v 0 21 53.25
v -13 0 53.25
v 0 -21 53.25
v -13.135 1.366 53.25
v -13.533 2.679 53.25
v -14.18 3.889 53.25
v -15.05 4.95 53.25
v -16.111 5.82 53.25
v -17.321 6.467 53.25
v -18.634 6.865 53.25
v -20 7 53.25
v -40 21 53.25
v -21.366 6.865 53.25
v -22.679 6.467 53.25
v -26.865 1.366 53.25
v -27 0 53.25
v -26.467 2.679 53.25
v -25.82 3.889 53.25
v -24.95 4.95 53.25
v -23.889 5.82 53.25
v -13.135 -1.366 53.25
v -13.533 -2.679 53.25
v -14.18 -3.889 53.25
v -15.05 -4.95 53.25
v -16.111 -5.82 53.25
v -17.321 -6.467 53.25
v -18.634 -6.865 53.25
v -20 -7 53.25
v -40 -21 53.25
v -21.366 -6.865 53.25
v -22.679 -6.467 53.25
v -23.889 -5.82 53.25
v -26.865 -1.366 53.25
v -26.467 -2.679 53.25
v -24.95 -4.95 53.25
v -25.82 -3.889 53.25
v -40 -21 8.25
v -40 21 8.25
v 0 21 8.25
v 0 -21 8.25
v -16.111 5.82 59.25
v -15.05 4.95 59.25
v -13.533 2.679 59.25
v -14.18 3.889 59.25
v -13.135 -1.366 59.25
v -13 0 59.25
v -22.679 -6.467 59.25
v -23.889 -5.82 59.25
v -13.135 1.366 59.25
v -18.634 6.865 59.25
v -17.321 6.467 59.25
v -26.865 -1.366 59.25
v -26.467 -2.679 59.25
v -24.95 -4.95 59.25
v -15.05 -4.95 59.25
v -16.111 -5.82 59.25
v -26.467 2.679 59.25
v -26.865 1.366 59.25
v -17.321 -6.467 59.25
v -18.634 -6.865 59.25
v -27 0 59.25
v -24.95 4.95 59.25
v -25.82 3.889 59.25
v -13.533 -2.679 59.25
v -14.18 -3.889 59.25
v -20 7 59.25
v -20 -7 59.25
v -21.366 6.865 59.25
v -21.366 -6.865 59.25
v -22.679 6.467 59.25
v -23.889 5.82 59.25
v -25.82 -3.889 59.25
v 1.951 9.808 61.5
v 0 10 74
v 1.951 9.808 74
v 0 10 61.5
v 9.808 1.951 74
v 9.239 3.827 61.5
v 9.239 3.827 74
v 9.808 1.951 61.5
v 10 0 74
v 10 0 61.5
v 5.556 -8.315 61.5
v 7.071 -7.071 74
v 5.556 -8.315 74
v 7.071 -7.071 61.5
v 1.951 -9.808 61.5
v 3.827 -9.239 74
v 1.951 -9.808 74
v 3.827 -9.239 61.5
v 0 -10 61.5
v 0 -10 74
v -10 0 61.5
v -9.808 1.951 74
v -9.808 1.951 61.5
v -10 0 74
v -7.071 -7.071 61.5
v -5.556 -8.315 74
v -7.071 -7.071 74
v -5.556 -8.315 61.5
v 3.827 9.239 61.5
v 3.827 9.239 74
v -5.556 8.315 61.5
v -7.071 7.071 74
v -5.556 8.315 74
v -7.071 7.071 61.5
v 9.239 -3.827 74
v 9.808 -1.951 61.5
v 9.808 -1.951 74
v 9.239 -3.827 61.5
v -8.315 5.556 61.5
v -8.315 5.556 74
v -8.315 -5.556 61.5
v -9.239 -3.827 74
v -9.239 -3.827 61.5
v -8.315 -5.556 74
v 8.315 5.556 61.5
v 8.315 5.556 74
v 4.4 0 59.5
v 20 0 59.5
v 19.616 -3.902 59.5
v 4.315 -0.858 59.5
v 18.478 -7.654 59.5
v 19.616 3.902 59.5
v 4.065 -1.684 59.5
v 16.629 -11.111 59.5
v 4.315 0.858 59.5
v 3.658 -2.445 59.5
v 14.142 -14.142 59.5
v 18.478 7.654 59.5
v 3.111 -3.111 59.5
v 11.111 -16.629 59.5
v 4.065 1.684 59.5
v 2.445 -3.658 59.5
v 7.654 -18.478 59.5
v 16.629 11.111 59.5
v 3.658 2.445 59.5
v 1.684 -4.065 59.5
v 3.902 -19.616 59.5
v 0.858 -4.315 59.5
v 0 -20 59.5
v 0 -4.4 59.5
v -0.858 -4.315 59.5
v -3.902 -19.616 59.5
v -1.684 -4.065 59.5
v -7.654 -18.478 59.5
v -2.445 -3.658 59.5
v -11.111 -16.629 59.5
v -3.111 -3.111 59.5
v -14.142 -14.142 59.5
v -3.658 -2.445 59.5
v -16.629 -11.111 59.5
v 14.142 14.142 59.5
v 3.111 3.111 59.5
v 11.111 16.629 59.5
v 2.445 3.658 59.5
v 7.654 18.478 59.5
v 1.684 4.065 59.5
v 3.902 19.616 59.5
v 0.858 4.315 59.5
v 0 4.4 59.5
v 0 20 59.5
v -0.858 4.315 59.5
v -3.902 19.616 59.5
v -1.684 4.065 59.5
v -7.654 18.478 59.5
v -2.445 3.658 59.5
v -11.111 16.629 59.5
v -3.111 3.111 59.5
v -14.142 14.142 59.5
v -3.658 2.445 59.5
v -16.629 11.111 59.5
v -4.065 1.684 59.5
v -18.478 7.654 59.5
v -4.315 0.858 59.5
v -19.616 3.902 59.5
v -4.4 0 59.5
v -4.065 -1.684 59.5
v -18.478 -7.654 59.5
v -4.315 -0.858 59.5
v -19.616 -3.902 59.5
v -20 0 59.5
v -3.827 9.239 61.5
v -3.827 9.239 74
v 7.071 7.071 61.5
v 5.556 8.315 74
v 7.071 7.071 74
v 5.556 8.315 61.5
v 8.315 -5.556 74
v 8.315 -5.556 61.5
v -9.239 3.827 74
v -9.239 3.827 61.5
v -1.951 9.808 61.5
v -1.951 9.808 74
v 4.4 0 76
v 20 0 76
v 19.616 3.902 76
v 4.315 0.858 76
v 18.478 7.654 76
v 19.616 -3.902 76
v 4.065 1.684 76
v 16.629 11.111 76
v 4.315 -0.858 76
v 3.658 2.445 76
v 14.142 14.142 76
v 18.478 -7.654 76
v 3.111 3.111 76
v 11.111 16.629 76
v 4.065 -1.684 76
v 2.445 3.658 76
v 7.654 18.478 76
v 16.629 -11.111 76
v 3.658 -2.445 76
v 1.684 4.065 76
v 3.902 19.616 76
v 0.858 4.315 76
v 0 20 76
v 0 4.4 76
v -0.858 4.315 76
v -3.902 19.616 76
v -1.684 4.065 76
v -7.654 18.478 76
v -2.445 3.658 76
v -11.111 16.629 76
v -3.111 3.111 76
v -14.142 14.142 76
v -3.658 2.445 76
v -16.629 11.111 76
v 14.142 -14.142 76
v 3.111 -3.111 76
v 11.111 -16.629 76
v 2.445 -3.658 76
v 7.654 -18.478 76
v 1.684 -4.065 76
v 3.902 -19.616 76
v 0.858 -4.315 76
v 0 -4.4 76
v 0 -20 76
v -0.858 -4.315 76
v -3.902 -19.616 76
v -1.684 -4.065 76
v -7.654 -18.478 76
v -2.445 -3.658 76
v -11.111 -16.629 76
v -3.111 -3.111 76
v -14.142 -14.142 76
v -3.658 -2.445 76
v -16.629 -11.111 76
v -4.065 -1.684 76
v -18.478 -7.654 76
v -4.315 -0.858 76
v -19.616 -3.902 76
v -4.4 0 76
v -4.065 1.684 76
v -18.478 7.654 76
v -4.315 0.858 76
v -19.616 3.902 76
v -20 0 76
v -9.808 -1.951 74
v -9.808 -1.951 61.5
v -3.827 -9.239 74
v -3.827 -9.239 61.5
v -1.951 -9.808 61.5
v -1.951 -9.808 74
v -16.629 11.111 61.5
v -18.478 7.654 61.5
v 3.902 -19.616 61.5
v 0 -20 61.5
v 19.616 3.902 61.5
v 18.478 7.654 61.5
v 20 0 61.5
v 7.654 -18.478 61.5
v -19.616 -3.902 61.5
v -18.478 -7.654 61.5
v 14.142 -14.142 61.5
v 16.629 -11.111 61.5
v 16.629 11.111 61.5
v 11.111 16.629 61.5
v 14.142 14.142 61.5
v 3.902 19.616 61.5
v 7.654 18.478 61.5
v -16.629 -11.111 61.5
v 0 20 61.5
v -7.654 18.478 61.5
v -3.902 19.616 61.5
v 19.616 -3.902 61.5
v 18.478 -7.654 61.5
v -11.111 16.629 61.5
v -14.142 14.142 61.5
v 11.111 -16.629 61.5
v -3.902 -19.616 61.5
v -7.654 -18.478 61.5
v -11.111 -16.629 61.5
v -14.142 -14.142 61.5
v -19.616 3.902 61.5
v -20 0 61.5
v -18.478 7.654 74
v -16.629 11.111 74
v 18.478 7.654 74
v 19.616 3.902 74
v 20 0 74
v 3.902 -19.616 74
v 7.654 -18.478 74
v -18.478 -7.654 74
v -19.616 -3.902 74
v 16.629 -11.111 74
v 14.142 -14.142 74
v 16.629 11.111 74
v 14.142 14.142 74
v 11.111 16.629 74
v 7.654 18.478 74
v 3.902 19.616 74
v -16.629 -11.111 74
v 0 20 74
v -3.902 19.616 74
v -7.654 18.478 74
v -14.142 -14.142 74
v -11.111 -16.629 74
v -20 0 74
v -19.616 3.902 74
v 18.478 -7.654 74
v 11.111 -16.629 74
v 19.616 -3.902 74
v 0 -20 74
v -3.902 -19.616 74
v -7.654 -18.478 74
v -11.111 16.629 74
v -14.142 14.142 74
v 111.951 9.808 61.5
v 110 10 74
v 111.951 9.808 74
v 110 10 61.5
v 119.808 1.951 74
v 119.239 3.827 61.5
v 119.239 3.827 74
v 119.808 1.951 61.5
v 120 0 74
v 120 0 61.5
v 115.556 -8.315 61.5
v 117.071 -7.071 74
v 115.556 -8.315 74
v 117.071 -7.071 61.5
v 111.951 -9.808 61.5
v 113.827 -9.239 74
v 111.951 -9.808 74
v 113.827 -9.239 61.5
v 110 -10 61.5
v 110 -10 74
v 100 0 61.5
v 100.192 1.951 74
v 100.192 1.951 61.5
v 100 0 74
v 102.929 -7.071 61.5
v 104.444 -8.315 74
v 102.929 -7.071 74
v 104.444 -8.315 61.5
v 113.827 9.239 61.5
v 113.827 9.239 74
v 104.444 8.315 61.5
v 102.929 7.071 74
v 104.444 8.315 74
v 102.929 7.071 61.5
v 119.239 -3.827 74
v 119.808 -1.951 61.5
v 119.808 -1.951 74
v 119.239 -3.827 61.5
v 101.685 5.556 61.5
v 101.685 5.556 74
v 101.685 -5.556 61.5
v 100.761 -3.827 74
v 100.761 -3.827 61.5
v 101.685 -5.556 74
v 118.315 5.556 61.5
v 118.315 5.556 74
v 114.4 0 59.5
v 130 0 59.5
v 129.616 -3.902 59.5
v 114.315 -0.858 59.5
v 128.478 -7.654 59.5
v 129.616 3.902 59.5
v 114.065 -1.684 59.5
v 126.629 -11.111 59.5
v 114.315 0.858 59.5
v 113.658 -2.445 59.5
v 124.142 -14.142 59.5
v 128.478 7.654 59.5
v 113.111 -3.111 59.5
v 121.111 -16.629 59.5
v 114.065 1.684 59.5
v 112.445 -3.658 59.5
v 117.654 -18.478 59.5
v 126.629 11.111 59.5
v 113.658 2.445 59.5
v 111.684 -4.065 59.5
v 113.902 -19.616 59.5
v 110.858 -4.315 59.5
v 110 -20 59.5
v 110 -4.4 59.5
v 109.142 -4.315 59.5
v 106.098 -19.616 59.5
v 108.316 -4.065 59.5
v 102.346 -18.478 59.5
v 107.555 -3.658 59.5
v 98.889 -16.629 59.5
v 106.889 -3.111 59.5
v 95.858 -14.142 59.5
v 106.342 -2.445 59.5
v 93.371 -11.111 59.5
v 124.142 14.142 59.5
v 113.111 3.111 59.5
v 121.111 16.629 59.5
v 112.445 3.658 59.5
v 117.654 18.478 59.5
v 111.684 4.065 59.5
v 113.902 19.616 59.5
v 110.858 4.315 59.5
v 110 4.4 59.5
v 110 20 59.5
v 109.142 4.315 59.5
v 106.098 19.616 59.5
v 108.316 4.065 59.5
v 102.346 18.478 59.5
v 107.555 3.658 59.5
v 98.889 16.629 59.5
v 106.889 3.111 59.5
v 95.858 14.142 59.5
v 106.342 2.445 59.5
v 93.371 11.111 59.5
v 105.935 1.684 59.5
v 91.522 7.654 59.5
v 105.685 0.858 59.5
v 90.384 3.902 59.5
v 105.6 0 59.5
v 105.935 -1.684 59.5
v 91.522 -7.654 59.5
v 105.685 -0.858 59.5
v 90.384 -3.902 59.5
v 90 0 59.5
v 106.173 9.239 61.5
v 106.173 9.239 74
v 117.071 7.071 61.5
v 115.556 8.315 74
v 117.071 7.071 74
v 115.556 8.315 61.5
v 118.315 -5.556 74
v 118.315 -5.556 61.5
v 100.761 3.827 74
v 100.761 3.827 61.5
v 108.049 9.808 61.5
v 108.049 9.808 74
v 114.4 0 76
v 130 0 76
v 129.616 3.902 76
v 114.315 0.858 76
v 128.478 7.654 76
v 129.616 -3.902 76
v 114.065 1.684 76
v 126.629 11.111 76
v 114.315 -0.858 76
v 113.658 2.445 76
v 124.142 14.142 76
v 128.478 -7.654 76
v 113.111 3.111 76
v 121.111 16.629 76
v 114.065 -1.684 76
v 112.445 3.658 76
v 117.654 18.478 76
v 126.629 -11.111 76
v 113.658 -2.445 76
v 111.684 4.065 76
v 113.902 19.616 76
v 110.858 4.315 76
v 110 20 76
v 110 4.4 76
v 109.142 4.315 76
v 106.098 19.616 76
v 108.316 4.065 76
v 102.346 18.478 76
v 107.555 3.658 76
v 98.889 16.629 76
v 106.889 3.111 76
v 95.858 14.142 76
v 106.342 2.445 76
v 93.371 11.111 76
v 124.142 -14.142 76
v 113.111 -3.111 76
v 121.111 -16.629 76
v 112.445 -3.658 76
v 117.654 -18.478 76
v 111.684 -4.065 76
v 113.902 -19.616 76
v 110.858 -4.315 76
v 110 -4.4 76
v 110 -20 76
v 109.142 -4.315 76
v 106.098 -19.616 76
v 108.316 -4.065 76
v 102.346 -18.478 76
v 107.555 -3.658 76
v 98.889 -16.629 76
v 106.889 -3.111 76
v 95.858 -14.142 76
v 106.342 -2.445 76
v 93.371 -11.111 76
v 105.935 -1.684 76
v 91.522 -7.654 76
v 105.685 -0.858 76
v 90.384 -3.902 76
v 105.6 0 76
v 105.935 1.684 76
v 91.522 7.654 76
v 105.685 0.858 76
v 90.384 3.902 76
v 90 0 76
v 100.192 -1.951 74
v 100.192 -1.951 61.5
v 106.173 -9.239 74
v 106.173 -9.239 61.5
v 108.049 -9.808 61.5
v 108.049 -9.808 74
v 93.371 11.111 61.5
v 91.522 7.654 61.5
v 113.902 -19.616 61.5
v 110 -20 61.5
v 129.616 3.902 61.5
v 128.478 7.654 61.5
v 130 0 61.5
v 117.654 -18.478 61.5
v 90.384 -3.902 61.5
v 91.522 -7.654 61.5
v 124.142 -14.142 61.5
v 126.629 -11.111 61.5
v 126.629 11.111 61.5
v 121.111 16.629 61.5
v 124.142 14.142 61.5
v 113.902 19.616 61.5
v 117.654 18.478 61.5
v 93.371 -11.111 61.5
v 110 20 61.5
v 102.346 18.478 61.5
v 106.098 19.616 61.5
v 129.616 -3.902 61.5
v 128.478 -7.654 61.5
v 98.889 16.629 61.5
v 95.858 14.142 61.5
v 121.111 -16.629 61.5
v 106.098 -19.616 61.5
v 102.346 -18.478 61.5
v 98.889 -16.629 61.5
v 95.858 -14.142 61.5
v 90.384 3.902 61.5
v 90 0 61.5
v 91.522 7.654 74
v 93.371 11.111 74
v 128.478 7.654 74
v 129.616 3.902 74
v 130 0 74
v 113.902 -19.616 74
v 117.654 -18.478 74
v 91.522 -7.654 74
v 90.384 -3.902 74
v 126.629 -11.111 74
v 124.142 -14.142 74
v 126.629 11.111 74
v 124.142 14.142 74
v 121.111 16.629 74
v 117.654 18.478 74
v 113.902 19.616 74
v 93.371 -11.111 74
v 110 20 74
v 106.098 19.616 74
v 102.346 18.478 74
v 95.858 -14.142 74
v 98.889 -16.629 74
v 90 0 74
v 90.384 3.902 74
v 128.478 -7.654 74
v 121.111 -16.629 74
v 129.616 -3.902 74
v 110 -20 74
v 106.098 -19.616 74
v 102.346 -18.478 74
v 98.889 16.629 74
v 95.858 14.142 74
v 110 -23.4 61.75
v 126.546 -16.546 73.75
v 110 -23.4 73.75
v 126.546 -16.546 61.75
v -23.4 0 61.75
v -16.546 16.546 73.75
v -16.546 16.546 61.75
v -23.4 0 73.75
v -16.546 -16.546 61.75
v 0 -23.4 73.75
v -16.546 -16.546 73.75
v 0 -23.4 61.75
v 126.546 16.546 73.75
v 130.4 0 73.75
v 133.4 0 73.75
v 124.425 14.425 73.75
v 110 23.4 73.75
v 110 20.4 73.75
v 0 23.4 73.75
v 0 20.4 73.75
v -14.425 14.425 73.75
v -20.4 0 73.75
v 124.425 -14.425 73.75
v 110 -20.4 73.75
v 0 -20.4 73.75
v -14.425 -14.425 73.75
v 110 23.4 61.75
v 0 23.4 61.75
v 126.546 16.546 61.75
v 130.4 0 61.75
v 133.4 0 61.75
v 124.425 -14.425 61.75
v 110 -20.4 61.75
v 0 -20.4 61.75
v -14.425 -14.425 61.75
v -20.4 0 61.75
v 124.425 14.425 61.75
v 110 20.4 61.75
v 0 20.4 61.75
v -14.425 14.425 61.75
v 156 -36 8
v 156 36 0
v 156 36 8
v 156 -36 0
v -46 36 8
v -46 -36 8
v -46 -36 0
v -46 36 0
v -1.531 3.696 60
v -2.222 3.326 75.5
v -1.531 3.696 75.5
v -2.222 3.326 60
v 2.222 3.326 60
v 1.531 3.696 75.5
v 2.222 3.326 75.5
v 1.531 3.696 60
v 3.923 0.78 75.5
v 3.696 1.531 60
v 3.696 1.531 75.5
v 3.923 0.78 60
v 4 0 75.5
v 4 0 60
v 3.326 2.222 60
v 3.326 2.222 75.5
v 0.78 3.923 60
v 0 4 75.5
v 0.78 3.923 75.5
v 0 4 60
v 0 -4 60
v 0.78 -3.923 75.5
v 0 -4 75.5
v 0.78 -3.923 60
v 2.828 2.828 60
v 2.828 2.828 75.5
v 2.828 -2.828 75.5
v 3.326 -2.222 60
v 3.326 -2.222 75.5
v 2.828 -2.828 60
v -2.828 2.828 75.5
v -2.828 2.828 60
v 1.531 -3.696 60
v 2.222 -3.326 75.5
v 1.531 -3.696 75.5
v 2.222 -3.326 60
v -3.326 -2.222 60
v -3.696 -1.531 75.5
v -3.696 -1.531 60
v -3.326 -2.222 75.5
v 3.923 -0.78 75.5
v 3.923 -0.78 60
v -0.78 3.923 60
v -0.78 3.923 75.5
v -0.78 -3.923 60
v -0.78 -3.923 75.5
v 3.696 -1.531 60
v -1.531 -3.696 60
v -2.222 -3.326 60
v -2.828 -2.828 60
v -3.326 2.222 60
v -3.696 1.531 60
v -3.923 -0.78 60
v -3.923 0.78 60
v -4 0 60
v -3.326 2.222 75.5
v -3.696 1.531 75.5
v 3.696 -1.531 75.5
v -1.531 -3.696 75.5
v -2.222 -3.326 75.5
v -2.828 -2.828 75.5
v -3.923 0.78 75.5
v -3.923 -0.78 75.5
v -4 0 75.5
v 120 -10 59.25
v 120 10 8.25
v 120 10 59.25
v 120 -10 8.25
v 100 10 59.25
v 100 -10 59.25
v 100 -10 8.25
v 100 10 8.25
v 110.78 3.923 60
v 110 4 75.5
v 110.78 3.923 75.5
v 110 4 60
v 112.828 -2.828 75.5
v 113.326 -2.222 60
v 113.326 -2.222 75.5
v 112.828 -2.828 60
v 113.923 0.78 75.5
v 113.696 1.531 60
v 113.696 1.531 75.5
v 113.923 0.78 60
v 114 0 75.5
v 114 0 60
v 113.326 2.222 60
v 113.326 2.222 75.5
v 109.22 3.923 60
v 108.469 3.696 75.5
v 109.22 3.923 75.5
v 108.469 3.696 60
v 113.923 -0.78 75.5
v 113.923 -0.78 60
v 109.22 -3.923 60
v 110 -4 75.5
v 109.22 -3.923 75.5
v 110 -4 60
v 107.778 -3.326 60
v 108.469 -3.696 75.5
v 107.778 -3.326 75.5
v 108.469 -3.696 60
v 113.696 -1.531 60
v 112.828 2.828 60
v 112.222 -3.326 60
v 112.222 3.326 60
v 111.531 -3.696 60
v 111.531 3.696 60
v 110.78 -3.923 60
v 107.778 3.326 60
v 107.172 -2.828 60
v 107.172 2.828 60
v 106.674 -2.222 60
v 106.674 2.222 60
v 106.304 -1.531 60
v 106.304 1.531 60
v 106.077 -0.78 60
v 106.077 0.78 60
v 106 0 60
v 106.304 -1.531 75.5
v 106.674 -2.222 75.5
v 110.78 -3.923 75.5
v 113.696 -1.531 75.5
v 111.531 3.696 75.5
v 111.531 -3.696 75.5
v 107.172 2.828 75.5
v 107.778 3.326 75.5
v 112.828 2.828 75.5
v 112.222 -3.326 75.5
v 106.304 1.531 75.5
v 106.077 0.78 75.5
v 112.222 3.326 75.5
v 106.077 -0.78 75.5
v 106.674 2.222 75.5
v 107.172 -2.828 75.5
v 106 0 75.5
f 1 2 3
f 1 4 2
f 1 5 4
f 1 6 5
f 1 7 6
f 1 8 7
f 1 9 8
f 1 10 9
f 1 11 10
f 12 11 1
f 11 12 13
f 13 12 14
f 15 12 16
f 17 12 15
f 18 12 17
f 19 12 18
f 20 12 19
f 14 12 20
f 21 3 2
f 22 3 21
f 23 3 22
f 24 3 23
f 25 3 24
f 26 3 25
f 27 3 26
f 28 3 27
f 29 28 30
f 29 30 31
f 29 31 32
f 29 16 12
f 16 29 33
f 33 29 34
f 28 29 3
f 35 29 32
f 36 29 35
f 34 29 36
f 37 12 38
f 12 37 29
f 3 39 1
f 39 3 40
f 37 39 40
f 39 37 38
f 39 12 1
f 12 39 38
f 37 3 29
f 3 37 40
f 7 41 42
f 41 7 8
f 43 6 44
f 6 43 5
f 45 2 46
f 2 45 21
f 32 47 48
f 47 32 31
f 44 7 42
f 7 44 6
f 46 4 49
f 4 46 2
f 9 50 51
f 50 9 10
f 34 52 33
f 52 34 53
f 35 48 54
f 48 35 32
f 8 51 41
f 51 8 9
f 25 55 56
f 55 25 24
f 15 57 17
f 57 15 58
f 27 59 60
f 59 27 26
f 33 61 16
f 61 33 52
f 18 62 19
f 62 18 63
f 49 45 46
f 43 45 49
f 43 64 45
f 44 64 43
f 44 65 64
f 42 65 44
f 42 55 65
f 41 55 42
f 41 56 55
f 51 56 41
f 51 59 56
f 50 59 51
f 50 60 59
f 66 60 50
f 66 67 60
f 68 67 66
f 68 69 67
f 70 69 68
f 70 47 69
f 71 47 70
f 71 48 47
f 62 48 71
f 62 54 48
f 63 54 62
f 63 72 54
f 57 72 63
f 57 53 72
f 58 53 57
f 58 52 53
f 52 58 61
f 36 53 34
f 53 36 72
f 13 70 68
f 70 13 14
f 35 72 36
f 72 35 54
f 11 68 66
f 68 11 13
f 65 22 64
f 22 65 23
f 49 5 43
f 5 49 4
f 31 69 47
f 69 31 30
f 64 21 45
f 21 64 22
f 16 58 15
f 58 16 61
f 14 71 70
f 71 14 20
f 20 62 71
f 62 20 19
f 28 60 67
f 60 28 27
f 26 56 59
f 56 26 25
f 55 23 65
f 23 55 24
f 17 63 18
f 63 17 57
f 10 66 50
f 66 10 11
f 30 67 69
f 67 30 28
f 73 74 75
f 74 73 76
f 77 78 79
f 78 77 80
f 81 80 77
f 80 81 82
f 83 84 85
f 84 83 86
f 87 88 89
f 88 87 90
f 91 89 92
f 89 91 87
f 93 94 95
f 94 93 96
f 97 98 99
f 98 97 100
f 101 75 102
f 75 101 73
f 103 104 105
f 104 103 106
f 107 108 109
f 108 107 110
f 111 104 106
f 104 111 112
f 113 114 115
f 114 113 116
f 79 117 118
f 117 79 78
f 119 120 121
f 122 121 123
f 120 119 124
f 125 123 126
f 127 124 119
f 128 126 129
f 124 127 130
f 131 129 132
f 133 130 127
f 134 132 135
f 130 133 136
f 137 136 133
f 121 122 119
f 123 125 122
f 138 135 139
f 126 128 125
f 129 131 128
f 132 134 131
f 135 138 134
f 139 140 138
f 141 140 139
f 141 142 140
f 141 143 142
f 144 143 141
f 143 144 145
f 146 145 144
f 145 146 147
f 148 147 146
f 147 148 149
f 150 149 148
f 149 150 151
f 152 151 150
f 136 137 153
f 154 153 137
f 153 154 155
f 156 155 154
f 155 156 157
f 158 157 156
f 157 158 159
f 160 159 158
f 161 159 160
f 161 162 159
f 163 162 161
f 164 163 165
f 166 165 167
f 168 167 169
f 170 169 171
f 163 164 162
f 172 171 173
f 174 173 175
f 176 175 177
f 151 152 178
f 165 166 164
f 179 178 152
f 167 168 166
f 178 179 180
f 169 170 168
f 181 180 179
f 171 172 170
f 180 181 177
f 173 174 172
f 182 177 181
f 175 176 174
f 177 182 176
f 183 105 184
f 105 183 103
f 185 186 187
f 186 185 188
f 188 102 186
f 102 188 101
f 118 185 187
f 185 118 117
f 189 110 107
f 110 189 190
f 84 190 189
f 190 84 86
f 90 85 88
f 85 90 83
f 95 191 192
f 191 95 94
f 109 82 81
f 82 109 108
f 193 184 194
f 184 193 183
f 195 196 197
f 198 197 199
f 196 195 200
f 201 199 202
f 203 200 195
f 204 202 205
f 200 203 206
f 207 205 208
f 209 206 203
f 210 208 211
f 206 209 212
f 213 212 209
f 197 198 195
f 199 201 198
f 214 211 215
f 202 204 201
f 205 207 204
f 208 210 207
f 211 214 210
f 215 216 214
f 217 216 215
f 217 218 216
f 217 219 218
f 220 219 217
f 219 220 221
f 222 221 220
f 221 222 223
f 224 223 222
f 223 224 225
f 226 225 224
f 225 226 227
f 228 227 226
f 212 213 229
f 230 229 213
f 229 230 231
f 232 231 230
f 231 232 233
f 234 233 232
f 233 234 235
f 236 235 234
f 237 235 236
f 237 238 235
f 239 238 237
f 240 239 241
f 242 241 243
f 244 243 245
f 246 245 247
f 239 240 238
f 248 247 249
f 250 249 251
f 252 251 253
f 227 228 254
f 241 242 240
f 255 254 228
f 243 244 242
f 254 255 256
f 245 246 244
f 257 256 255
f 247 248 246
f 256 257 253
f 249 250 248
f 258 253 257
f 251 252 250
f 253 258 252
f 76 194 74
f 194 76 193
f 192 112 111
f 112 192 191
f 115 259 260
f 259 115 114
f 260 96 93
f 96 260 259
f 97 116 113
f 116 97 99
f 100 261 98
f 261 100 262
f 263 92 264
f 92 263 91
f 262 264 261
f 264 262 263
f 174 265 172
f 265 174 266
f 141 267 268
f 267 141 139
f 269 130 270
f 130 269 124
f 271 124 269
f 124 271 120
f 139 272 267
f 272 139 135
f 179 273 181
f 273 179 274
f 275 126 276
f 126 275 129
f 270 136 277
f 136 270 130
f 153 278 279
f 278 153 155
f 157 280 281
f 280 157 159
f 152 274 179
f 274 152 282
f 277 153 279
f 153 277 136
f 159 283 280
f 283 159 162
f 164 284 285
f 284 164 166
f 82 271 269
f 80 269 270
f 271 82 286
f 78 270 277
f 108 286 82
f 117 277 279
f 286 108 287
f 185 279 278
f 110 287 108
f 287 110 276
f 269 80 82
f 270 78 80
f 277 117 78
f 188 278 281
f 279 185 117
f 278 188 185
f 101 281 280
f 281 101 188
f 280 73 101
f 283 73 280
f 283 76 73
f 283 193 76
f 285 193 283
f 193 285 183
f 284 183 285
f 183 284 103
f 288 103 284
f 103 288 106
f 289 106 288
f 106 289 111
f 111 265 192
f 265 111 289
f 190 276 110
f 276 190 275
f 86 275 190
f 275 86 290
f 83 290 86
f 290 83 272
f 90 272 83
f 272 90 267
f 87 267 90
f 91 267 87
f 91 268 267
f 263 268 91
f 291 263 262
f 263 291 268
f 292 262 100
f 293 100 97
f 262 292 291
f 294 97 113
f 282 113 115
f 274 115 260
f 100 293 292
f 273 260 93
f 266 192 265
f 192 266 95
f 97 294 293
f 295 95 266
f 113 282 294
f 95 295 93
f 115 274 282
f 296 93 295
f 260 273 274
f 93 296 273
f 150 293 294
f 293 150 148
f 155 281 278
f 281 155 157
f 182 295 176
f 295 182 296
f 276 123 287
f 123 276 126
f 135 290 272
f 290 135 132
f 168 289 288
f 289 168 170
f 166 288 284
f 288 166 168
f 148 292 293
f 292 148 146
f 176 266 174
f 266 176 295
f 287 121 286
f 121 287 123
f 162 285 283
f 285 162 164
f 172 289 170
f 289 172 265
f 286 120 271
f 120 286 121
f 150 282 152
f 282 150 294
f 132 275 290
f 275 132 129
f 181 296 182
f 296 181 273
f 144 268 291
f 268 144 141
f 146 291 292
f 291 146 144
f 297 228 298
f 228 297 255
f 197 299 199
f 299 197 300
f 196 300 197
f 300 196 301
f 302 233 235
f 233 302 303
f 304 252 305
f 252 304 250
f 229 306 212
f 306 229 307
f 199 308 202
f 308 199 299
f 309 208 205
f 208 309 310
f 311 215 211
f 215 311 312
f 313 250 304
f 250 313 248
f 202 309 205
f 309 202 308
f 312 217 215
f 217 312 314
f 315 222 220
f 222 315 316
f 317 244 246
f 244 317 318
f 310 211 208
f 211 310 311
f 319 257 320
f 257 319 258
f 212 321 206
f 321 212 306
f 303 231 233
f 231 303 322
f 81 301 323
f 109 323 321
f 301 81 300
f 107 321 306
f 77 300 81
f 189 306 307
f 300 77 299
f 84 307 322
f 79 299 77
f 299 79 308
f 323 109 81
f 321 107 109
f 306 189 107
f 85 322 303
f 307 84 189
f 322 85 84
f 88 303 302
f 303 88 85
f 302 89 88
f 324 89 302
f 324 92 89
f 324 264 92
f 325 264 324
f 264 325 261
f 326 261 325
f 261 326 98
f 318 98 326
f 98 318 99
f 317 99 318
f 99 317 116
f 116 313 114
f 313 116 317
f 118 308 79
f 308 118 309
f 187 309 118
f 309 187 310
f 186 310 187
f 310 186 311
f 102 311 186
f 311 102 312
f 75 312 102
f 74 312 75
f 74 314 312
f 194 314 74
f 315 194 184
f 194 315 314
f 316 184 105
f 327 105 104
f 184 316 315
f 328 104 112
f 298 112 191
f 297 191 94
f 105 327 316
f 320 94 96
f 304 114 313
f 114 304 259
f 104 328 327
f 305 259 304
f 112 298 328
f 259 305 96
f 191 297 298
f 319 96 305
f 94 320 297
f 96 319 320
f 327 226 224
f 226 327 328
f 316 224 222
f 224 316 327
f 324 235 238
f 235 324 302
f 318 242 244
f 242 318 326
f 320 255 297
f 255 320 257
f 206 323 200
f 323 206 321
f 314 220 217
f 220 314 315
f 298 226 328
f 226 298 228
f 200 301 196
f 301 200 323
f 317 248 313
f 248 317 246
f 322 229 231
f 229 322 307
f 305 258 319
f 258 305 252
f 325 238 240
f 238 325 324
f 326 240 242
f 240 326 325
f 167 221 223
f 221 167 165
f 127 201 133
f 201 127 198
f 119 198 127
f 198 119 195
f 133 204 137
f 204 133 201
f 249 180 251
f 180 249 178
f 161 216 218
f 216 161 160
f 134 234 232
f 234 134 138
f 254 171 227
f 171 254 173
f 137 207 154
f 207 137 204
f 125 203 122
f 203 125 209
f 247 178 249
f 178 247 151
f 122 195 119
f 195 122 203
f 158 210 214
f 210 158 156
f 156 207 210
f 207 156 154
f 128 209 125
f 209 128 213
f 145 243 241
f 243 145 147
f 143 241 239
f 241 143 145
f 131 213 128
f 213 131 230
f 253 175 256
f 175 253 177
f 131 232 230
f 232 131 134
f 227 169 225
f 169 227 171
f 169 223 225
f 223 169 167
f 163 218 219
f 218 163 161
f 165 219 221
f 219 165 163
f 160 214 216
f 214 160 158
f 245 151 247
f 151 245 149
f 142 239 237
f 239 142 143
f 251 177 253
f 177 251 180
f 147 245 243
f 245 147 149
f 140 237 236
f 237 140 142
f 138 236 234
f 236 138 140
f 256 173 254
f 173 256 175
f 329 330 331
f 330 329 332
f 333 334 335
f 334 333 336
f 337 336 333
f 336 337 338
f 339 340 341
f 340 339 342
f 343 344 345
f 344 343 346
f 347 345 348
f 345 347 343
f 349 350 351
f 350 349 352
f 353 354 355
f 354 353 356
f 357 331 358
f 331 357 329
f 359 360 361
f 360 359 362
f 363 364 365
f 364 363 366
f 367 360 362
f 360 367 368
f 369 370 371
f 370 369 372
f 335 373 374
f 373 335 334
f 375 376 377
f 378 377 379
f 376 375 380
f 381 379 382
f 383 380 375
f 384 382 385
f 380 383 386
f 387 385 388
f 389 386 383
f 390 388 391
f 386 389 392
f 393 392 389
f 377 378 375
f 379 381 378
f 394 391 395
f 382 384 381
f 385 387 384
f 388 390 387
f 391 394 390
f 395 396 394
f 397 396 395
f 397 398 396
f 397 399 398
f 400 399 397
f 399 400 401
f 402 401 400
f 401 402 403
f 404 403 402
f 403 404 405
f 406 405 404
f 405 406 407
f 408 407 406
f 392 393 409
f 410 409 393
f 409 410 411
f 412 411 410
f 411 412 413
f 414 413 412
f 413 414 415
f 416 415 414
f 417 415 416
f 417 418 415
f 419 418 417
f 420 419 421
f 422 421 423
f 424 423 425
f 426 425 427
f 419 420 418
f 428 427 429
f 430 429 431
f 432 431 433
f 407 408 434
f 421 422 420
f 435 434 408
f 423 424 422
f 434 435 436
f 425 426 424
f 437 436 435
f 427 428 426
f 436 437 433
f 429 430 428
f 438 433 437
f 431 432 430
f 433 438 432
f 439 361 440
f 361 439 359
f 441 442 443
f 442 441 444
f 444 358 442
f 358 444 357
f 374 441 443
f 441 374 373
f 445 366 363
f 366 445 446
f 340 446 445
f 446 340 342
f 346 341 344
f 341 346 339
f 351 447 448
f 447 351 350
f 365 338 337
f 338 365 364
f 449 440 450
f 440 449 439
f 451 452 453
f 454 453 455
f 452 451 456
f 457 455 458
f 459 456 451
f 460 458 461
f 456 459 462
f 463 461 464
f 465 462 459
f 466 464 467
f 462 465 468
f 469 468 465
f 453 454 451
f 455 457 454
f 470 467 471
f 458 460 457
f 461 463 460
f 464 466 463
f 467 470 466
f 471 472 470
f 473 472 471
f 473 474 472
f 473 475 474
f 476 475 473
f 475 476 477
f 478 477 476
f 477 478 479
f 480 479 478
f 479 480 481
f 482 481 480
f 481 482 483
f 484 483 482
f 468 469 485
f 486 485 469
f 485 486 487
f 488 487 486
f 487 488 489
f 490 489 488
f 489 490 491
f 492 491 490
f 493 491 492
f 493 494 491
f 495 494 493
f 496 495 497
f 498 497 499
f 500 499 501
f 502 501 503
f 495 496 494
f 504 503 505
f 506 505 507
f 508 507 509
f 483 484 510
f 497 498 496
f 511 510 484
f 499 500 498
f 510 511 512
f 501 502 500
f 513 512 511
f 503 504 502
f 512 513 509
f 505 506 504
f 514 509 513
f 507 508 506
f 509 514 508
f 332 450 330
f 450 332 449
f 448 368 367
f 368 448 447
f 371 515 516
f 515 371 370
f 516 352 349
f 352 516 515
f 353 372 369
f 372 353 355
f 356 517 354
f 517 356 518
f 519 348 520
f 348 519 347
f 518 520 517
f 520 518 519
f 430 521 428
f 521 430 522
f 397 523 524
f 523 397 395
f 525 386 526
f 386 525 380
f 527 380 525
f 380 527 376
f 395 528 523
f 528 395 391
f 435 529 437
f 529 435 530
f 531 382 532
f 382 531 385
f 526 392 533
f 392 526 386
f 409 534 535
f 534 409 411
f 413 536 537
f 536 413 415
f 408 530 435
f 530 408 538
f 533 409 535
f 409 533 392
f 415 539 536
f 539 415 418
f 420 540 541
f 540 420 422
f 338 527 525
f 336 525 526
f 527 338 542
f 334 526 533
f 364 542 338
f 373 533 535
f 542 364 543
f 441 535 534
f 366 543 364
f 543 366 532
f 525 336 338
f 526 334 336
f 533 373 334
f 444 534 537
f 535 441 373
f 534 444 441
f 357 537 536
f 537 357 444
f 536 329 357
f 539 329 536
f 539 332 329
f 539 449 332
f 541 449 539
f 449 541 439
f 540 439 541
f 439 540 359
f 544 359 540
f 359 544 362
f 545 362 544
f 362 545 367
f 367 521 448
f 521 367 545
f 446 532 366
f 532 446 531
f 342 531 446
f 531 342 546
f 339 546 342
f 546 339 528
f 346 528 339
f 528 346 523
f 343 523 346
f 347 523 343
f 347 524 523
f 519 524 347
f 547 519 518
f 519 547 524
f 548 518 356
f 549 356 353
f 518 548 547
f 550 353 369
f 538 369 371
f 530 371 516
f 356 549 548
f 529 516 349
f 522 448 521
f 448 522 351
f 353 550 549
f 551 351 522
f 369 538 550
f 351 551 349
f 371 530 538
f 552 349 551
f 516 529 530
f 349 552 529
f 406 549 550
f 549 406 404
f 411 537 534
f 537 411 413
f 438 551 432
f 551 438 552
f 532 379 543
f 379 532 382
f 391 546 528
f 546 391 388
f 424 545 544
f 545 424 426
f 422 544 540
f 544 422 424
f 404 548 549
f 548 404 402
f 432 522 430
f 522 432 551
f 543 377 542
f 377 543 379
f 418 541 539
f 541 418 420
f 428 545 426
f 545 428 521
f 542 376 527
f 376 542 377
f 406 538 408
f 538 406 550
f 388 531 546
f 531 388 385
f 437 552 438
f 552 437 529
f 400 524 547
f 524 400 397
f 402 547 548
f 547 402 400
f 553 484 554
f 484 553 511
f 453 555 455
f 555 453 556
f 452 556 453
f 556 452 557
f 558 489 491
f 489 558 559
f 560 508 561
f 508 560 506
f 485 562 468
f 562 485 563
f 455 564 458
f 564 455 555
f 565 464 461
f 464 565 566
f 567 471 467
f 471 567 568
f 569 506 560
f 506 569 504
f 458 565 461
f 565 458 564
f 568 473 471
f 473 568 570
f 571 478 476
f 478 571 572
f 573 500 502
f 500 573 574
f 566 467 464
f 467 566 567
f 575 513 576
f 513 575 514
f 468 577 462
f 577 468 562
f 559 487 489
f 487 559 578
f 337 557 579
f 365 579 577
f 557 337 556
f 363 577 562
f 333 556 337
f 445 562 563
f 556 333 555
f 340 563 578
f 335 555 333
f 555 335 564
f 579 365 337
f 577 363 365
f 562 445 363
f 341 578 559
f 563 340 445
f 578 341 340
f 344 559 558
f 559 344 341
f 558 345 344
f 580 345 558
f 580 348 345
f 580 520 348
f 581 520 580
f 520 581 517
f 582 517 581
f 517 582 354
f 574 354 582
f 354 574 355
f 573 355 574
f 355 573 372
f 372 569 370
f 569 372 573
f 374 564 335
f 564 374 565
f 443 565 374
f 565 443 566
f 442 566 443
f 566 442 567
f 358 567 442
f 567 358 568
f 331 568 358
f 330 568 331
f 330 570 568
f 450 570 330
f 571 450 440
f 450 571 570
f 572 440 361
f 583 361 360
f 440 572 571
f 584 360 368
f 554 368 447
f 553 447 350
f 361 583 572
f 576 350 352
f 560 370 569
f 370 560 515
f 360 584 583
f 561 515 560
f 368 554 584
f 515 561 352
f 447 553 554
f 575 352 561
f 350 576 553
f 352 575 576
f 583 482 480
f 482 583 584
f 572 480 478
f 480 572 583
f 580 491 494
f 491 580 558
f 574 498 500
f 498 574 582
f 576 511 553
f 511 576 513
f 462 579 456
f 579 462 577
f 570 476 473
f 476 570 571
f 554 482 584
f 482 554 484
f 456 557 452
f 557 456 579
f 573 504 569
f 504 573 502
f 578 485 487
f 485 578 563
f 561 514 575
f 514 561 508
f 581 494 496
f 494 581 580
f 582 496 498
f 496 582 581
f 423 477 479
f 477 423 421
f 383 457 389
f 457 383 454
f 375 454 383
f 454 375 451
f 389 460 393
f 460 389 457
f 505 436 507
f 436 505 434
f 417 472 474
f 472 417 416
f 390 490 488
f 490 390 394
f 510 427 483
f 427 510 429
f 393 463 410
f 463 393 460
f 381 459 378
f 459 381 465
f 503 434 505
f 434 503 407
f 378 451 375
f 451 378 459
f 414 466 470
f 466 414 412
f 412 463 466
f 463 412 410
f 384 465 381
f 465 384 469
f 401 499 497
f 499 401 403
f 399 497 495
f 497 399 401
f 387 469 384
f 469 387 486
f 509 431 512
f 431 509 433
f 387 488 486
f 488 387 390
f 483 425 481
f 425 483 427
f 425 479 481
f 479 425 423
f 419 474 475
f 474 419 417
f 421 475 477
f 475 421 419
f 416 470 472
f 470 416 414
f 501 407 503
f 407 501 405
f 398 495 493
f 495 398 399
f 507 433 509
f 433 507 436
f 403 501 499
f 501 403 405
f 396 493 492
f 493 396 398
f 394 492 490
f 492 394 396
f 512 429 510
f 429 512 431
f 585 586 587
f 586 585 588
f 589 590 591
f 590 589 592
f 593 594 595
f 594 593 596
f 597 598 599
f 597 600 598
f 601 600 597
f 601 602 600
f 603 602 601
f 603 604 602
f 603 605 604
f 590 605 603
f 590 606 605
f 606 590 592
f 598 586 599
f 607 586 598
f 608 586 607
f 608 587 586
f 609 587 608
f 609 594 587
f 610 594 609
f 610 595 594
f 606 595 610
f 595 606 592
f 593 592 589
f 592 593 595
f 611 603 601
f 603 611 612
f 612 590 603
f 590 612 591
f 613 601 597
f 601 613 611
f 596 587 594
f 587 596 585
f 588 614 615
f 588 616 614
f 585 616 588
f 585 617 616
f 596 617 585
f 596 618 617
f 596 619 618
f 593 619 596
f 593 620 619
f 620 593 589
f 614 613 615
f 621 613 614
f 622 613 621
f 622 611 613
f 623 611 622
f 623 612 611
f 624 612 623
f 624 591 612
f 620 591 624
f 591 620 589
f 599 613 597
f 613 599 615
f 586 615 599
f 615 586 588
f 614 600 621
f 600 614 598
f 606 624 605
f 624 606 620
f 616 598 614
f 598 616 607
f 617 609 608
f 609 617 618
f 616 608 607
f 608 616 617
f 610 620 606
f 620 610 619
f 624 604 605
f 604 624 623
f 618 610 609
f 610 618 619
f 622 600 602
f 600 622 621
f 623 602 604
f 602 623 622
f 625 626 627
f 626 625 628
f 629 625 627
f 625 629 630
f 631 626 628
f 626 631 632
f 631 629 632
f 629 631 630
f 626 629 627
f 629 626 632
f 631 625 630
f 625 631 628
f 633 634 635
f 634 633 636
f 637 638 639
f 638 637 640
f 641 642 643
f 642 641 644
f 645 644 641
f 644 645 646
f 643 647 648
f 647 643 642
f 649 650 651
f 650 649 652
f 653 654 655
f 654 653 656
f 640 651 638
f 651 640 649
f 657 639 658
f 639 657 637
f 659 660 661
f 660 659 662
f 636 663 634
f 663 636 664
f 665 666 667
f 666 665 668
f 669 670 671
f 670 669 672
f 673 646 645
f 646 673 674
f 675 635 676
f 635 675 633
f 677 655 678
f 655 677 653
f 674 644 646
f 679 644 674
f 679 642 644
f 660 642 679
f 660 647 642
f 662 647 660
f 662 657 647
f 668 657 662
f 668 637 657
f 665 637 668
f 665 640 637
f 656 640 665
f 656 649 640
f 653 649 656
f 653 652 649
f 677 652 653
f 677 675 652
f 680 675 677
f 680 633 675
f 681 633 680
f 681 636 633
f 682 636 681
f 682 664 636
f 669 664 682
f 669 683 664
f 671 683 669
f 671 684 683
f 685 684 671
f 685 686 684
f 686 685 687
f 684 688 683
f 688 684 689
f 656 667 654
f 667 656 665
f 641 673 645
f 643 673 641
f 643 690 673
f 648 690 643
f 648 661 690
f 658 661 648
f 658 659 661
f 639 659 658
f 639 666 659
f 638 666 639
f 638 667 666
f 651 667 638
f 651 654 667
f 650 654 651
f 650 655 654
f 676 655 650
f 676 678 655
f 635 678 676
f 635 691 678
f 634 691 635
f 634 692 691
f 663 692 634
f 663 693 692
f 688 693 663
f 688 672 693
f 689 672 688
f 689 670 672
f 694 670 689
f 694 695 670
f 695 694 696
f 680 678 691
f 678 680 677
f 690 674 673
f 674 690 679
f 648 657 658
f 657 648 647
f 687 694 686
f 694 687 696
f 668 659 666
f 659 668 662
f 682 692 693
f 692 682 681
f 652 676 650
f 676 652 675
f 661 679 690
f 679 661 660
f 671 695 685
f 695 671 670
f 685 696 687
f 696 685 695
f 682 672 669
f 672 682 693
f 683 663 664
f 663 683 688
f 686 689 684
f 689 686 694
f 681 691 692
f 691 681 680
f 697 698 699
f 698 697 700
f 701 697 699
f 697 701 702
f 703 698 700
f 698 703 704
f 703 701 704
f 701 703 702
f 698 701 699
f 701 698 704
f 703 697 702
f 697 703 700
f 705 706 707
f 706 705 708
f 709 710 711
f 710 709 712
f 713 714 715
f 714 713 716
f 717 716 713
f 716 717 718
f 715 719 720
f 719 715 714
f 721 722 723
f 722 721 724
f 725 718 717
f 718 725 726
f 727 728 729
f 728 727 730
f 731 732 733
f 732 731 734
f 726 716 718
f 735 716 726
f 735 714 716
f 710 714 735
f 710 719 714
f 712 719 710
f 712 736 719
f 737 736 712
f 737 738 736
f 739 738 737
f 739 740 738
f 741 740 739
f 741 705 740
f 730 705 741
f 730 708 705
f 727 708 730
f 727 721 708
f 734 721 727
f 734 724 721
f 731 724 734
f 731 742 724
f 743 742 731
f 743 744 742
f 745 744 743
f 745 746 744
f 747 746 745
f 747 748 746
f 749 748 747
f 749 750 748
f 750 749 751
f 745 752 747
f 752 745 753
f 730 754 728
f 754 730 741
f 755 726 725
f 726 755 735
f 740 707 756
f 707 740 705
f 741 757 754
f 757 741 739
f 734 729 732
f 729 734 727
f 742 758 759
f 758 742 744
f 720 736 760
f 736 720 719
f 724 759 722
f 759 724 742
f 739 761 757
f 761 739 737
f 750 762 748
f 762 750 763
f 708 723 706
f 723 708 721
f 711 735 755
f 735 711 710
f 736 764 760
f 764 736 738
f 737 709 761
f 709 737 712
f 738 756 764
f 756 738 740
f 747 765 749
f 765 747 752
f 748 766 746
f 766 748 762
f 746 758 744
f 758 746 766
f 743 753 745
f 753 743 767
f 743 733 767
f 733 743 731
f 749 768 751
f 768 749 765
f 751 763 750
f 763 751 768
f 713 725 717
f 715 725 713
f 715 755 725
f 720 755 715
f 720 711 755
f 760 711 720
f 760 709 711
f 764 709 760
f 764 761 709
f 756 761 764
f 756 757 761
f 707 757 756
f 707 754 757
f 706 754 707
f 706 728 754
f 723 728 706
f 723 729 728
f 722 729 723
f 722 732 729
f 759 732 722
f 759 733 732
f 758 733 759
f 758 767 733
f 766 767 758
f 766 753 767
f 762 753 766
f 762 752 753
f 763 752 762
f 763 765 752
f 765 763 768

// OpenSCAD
$fn = 32;

// ------------------------------------------------------------------------
// Motor belt drive: span 110 mm, pulleys d40, belt 12 mm wide
// Every part is its own module, assembly() places every instance.
// ------------------------------------------------------------------------

// --- part 1 ---
module base_plate() {
  difference() {
    translate([-101, -36, 0]) cube([202, 72, 8]);
  }
}

// --- part 2 ---
module motor() {
  union() {
    translate([-22.5, -21, 0]) cube([45, 42, 40]);
    translate([25.5, 0, 20]) rotate([0, 90, 0]) cylinder(h = 6, d = 14, center = true);
  }
}

// --- part 3 ---
module drive_shaft() {
  translate([0, 0, -7.75]) cylinder(h = 15.5, d = 8);
}

// --- part 4 ---
module pulley_drive() {
  difference() {
    union() {
      cylinder(h = 16.5, d = 20);
      cylinder(h = 2, d = 40);
      translate([0, 0, 14.5]) cylinder(h = 2, d = 40);
    }
    translate([0, 0, -1]) cylinder(h = 18.5, d = 8.8);
  }
}

// --- part 5 ---
module idler_post() {
  translate([-10, -10, 0]) cube([20, 20, 51]);
}

// --- part 6 ---
module driven_shaft() {
  translate([0, 0, -7.75]) cylinder(h = 15.5, d = 8);
}

// --- part 7 ---
module pulley_driven() {
  difference() {
    union() {
      cylinder(h = 16.5, d = 20);
      cylinder(h = 2, d = 40);
      translate([0, 0, 14.5]) cylinder(h = 2, d = 40);
    }
    translate([0, 0, -1]) cylinder(h = 18.5, d = 8.8);
  }
}

// --- part 8 ---
module drive_belt() {
  difference() {
    linear_extrude(height = 12) polygon(points = concat([for (a = [90 : 45 : 270]) [23.4 * cos(a), 23.4 * sin(a)]], [for (a = [270 : 45 : 450]) [110 + 23.4 * cos(a), 23.4 * sin(a)]]));
    translate([0, 0, -1]) linear_extrude(height = 14) polygon(points = concat([for (a = [90 : 45 : 270]) [20.4 * cos(a), 20.4 * sin(a)]], [for (a = [270 : 45 : 450]) [110 + 20.4 * cos(a), 20.4 * sin(a)]]));
  }
}

// --- assembly ---
module assembly() {
  color([0.80, 0.24, 0.20]) translate([55, 0, 0]) rotate([0, 0, 0]) base_plate();
  color([0.20, 0.45, 0.75]) translate([0, 0, 30.75]) rotate([0, 270, 0]) motor();
  color([0.25, 0.62, 0.32]) translate([0, 0, 67.75]) rotate([0, 0, 0]) drive_shaft();
  color([0.92, 0.70, 0.18]) translate([0, 0, 59.5]) rotate([0, 0, 0]) pulley_drive();
  color([0.58, 0.35, 0.70]) translate([110, 0, 8.25]) rotate([0, 0, 0]) idler_post();
  color([0.16, 0.66, 0.66]) translate([110, 0, 67.75]) rotate([0, 0, 0]) driven_shaft();
  color([0.85, 0.48, 0.18]) translate([110, 0, 59.5]) rotate([0, 0, 0]) pulley_driven();
  color([0.55, 0.60, 0.65]) translate([0, 0, 61.75]) rotate([0, 0, 0]) drive_belt();
}

assembly();
